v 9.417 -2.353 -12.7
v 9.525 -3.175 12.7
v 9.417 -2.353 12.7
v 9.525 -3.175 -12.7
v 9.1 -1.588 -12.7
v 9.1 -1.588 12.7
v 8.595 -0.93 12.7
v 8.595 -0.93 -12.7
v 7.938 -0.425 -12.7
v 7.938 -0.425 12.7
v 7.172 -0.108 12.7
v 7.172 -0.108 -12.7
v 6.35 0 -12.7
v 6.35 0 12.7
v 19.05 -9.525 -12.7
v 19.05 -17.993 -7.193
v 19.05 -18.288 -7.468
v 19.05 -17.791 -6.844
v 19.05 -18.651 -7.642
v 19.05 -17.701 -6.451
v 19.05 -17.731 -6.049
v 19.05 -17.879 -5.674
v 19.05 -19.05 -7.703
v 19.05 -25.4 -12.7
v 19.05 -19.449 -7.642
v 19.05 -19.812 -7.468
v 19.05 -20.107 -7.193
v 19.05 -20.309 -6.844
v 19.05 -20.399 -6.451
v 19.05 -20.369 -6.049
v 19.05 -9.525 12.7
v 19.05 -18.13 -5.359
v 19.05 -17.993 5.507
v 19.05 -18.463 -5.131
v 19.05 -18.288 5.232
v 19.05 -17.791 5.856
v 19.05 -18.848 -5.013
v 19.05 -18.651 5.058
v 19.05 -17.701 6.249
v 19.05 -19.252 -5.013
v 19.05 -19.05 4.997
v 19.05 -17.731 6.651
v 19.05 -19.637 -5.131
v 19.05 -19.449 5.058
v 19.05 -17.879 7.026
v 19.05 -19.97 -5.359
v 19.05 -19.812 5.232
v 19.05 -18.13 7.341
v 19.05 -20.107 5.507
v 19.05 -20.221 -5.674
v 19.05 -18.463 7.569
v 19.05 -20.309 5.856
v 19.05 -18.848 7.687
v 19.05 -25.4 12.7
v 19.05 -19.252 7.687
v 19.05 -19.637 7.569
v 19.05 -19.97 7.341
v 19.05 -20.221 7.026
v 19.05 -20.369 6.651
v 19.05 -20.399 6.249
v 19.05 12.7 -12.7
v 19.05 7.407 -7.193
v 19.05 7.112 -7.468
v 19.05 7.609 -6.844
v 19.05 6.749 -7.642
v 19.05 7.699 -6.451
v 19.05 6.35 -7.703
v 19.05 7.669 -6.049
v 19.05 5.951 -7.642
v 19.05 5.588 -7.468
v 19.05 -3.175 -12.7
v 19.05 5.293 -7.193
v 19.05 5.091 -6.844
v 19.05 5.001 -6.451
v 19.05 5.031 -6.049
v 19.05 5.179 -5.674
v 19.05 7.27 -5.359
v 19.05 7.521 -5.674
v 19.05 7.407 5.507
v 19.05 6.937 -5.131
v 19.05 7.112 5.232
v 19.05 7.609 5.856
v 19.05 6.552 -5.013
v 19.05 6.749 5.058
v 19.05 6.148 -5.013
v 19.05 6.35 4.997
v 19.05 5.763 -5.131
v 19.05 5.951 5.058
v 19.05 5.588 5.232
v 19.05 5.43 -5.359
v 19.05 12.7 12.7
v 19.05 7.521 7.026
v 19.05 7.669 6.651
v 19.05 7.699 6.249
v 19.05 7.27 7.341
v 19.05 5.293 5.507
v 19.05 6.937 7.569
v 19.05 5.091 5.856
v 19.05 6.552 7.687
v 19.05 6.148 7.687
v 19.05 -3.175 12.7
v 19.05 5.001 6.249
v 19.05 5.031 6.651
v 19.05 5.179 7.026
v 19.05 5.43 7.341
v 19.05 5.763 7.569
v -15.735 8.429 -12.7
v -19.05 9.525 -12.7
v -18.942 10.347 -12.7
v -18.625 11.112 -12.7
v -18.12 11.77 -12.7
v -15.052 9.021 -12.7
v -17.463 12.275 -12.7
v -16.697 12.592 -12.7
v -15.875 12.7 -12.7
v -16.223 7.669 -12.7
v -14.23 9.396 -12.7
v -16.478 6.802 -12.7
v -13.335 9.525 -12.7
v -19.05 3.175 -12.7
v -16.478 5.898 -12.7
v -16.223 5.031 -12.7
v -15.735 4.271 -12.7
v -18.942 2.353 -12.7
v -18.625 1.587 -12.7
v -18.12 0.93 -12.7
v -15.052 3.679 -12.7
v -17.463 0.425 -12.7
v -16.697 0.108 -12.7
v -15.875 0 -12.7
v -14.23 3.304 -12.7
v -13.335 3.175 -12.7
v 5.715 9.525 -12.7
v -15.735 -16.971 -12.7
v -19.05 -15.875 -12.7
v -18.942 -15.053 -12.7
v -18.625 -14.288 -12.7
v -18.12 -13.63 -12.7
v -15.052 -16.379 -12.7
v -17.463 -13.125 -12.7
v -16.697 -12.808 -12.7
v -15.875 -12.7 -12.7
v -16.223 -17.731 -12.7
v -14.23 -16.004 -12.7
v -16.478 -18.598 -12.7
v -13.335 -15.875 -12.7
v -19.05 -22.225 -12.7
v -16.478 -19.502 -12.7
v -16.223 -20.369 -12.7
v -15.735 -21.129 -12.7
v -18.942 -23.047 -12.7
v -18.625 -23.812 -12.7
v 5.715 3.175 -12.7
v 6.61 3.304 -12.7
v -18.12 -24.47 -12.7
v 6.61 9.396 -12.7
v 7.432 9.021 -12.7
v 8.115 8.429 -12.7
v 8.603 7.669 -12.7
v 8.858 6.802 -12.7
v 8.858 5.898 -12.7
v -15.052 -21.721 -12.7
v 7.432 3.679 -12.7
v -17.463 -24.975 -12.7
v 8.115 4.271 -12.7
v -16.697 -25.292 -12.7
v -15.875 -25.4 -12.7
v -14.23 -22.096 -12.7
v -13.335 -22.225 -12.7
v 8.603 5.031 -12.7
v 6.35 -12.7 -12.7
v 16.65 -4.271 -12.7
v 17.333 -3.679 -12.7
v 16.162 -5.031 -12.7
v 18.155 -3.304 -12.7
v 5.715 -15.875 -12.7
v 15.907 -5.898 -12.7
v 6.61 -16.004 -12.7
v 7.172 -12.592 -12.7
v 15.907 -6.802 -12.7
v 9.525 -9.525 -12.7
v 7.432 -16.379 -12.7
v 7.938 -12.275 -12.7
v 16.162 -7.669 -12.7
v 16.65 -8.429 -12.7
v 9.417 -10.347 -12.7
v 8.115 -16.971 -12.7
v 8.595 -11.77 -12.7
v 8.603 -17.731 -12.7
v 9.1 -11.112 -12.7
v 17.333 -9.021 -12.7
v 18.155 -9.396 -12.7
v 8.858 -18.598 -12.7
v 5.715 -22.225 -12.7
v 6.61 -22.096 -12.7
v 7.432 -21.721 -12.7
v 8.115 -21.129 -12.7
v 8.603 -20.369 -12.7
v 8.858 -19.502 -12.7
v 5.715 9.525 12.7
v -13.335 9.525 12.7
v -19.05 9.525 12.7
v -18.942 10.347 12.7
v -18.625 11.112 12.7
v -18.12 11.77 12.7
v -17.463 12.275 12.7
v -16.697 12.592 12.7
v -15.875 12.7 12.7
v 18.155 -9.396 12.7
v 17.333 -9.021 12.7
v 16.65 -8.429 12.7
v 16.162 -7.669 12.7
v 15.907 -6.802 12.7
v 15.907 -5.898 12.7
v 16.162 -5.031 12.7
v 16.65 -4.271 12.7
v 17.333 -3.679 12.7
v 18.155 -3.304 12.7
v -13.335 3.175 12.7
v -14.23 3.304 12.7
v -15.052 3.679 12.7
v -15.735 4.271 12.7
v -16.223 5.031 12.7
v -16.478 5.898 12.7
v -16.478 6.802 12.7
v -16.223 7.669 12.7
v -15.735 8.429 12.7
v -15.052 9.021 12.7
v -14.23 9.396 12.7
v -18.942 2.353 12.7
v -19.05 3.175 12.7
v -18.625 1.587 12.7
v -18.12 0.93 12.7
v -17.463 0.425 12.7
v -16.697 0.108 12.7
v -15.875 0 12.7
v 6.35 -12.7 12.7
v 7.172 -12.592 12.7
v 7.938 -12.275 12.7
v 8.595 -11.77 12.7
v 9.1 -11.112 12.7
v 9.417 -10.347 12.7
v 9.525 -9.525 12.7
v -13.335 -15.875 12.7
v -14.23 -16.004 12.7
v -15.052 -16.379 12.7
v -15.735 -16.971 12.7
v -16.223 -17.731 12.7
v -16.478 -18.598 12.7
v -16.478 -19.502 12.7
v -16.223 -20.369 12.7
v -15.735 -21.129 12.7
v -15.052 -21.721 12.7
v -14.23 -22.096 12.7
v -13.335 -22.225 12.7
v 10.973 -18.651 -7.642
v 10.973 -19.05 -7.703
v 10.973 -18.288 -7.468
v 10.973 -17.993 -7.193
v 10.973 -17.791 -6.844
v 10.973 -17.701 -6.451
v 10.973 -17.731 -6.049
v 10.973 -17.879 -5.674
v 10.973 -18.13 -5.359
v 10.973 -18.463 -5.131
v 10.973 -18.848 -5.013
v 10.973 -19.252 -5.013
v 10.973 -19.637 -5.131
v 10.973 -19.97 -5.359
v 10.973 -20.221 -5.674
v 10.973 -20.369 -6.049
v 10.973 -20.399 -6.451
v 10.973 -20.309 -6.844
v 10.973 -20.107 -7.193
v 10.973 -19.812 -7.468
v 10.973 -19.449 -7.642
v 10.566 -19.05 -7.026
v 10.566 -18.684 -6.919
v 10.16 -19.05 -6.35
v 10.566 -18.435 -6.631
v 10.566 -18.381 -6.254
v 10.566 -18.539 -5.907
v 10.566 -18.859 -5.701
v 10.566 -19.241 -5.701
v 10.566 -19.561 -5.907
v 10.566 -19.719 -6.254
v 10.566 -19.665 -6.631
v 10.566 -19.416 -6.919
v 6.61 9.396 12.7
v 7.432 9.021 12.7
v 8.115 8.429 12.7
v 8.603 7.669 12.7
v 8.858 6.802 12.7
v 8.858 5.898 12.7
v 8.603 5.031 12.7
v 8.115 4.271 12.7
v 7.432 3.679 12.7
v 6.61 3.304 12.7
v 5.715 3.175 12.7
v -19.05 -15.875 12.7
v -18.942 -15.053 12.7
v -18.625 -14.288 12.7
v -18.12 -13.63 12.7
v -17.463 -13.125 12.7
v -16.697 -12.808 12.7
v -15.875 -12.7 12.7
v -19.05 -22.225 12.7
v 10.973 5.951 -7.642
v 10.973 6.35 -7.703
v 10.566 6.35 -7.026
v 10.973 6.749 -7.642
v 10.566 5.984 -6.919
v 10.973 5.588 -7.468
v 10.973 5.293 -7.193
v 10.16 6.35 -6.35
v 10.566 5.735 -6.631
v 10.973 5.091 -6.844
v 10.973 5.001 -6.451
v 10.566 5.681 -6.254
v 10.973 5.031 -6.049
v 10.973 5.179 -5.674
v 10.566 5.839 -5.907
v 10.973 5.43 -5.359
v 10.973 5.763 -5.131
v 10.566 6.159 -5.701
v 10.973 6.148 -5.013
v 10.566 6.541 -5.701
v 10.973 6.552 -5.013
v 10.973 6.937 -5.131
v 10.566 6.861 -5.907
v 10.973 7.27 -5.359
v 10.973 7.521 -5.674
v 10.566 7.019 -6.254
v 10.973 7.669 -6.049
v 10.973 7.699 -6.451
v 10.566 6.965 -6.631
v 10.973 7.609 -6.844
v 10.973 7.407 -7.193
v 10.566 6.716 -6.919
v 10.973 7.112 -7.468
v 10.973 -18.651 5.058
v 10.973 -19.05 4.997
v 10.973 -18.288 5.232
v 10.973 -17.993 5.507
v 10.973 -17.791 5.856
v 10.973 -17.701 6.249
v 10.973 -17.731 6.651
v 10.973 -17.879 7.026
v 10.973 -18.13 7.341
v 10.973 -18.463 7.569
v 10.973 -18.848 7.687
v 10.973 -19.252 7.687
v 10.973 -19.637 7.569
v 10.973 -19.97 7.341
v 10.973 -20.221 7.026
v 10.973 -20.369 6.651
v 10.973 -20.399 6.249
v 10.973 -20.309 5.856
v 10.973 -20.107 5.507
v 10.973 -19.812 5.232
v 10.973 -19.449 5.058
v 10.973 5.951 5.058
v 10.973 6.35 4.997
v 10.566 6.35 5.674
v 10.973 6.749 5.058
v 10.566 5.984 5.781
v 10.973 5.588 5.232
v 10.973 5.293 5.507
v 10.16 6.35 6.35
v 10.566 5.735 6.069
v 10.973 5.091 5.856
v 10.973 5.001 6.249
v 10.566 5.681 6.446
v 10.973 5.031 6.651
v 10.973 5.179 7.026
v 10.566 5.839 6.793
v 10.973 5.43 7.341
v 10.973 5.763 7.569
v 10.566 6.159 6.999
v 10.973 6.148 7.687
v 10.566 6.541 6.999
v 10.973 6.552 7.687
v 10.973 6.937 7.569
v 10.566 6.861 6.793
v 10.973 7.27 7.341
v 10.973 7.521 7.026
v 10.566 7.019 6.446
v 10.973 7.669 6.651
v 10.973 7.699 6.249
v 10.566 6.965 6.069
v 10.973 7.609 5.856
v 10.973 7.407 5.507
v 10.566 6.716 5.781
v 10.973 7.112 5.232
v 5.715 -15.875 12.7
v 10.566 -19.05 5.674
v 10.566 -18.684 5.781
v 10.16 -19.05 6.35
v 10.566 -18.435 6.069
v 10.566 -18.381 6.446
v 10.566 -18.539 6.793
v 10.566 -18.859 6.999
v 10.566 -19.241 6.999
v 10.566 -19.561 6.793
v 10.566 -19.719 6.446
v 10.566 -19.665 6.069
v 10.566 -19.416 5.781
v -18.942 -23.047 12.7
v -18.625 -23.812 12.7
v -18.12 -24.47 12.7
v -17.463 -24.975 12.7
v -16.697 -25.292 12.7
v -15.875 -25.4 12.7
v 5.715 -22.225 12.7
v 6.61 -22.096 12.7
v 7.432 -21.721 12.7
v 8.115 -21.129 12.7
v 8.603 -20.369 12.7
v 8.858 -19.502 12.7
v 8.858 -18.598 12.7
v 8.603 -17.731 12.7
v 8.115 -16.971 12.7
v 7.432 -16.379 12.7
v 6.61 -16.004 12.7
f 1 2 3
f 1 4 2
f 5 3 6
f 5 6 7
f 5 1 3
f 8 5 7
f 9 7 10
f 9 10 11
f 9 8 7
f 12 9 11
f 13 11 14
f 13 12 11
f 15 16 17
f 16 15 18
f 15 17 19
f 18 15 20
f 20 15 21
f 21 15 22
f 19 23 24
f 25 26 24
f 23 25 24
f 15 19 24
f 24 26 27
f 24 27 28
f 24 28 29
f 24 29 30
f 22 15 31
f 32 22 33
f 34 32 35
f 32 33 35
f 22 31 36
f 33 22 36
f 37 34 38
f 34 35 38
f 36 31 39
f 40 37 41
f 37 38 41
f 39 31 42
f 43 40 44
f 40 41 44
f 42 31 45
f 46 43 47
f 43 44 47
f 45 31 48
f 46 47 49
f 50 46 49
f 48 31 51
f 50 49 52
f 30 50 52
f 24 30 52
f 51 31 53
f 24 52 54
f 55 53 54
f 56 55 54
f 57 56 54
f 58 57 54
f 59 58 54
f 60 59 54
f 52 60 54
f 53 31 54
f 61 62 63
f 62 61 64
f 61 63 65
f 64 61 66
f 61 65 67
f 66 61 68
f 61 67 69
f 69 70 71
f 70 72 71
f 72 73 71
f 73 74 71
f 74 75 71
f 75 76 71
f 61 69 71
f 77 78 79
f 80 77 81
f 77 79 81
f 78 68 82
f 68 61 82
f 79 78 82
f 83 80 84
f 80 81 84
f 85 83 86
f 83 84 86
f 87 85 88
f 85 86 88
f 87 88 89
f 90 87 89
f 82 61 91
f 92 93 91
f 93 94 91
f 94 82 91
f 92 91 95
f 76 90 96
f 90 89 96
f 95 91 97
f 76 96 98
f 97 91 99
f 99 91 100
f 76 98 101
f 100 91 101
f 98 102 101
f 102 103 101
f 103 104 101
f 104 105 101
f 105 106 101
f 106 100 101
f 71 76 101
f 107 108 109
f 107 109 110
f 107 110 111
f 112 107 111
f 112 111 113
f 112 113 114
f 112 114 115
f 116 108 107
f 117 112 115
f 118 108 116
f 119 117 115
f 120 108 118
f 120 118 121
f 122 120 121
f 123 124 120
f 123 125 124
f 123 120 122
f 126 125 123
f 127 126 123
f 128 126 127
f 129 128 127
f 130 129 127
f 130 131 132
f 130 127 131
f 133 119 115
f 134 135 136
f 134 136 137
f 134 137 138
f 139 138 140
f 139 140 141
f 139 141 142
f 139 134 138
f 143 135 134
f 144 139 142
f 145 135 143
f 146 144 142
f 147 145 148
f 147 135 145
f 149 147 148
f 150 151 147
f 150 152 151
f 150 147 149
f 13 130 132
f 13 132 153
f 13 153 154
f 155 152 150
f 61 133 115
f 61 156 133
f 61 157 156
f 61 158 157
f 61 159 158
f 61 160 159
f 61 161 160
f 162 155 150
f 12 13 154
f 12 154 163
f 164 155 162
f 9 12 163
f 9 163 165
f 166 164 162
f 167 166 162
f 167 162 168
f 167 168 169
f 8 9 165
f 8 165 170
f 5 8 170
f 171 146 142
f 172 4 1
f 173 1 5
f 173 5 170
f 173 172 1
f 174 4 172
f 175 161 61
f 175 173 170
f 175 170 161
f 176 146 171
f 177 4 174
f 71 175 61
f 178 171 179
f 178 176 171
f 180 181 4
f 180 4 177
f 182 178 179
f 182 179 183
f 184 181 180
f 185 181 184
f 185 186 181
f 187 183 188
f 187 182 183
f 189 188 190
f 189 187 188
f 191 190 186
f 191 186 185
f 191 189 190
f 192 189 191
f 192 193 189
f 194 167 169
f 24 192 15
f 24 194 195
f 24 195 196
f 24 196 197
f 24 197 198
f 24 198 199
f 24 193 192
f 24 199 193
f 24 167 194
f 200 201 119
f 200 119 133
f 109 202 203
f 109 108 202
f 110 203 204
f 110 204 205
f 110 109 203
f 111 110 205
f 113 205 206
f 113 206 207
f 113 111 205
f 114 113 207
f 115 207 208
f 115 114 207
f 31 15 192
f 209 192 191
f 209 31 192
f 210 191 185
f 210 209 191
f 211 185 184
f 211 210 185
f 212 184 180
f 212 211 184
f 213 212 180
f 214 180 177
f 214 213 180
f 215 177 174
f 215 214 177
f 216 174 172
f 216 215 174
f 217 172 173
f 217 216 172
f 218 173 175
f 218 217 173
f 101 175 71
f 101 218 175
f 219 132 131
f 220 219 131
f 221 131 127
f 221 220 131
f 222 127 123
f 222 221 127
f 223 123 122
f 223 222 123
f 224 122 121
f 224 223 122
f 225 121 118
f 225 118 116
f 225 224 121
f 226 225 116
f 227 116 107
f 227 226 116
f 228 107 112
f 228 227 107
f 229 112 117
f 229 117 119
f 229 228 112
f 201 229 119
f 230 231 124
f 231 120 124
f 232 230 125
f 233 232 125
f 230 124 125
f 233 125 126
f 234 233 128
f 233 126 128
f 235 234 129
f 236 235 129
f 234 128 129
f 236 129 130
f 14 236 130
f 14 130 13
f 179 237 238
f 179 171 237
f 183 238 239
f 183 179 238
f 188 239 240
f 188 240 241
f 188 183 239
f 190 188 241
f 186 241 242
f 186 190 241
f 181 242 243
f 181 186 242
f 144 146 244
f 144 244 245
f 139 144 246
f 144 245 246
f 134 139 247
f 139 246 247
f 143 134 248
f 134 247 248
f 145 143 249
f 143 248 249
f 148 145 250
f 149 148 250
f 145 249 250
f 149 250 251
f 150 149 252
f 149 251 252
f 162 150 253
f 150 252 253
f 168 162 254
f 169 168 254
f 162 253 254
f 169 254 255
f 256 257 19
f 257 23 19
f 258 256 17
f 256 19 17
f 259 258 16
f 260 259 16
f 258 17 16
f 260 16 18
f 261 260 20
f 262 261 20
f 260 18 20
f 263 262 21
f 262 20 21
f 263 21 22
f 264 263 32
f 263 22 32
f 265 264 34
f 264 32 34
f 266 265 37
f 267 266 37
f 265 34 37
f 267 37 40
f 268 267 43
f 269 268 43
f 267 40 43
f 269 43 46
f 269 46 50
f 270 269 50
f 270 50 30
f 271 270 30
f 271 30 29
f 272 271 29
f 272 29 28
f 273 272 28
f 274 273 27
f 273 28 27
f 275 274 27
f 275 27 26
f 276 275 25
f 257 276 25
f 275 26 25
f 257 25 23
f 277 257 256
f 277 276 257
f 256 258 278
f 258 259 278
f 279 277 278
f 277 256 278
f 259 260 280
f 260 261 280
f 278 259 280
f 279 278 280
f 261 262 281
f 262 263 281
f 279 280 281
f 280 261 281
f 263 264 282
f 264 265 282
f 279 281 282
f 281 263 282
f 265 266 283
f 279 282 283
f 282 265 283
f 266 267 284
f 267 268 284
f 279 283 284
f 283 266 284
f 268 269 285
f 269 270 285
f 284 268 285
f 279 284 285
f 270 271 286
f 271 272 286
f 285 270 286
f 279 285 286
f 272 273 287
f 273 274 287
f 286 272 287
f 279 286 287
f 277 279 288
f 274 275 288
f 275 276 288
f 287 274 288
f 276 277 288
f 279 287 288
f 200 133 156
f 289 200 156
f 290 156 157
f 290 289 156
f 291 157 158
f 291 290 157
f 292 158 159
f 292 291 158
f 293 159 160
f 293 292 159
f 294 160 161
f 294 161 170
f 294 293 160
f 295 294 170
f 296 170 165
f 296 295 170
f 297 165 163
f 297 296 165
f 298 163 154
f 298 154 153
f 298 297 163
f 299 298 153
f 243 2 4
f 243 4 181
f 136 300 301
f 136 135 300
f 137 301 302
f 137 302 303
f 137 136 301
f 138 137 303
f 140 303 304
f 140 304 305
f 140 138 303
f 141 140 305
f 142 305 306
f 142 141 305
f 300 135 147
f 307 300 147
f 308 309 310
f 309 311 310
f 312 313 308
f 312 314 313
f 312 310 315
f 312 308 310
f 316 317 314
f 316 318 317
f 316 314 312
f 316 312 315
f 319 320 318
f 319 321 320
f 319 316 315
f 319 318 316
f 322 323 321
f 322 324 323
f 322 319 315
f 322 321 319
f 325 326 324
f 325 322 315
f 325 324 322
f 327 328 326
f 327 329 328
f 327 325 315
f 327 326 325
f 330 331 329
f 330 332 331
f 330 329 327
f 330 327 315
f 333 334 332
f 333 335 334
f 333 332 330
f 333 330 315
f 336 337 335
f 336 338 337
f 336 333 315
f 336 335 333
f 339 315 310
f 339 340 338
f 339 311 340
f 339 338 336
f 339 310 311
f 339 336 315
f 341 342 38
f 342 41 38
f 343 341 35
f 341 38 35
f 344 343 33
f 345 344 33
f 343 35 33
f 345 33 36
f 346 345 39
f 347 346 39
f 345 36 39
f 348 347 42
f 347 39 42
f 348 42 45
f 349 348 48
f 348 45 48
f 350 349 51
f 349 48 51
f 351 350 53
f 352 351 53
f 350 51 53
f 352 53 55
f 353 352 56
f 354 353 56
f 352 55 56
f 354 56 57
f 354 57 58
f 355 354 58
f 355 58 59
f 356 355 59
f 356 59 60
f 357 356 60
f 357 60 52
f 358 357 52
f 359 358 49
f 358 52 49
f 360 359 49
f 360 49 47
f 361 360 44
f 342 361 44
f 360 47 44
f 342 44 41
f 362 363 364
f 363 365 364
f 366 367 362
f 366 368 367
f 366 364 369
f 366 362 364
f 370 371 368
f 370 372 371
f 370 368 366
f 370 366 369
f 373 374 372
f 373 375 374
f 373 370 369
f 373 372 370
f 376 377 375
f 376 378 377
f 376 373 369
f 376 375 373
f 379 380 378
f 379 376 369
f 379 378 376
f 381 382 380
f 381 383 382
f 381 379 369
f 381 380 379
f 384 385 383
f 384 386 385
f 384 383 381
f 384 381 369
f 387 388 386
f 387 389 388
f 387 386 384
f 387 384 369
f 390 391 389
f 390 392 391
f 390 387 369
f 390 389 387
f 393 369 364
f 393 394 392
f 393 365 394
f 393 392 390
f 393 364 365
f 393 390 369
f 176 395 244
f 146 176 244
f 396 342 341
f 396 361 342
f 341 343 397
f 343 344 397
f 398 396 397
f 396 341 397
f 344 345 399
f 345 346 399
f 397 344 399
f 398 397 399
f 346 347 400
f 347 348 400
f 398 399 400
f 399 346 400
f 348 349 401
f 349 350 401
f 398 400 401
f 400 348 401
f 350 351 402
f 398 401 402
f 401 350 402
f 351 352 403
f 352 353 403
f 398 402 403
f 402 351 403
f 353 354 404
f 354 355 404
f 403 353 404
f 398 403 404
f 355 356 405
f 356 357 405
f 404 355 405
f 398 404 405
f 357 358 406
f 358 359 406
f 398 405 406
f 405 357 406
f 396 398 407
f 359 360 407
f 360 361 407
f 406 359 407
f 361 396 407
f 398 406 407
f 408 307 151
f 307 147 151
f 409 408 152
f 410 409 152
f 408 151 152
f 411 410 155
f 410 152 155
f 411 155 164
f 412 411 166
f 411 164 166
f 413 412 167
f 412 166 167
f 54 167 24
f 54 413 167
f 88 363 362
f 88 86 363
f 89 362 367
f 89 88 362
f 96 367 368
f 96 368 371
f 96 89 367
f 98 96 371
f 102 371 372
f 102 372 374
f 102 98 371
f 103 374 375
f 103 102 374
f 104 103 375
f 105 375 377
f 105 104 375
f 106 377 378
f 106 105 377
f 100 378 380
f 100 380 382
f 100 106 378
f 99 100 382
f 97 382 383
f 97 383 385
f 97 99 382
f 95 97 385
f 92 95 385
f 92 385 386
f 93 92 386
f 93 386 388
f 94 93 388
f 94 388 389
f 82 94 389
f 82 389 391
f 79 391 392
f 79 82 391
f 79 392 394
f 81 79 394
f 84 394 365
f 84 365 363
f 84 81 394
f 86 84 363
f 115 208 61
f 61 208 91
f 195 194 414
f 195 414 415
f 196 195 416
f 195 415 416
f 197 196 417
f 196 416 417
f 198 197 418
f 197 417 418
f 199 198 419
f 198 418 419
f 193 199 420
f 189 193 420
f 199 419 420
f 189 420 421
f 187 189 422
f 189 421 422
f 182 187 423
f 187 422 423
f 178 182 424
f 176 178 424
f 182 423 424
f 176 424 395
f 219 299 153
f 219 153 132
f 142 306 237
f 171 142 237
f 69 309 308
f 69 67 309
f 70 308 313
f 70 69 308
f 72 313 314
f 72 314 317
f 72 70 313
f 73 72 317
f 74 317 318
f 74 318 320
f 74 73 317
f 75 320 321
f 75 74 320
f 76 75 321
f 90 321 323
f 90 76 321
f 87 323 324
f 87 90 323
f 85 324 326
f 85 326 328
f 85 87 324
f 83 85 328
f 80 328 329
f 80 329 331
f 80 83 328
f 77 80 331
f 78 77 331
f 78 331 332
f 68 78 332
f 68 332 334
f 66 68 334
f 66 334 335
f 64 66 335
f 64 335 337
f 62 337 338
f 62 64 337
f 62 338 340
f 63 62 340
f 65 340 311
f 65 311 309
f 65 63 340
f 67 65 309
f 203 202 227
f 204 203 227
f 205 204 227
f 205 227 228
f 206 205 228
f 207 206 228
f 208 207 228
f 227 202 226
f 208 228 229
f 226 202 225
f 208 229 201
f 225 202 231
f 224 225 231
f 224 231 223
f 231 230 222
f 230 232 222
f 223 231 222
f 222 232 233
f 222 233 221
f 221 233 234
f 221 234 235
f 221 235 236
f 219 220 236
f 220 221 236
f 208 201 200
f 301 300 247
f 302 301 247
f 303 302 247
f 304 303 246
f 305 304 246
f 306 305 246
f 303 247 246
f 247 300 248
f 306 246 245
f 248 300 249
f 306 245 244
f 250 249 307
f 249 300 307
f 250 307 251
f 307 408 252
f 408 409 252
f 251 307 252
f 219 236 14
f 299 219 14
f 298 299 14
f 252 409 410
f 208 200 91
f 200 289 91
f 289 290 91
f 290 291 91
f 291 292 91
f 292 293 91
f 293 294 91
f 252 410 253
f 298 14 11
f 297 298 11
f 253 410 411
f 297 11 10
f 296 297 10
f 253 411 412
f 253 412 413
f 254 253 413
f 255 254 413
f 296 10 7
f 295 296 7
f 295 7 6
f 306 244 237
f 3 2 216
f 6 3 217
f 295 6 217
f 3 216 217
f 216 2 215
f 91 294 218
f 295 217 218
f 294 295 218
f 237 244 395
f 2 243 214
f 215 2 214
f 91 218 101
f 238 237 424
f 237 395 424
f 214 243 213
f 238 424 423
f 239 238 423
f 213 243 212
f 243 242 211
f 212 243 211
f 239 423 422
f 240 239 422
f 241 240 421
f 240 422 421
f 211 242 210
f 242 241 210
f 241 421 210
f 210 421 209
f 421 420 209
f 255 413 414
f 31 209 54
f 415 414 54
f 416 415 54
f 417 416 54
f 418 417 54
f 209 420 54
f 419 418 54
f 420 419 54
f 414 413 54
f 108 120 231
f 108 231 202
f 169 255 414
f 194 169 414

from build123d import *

# Parameters (mm, degrees)
SKETCH1_W                      = 38.1
SKETCH1_H                      = 25.4
BOSS_EXTRUDE1_DEPTH            = 12.7
CUT_EXTRUDE2_REACH             = 36.196
SKETCH7_R                      = 3.175
F_6_32_TAPPED_HOLE1_AT_2_COUNT = 2
F_6_32_TAPPED_HOLE1_AT_2_PITCH = 12.7
CUT_EXTRUDE3_DEPTH             = 25.4
SKETCH14_W                     = 28.575
SKETCH14_H                     = 12.7
CUT_EXTRUDE5_DEPTH             = 25.4
FILLET2_R                      = 3.175
FILLET2_OF_MIRROR1_R           = 3.175
FILLET3_R                      = 3.175


with BuildPart() as part:
    # Sketch1 → Boss-Extrude1 (new, symmetric)
    with BuildSketch(Plane.XY):
        Rectangle(SKETCH1_W, SKETCH1_H)
    boss_extrude1 = extrude(amount=BOSS_EXTRUDE1_DEPTH, both=True)

    # Sketch7 → Cut-Extrude2 (cut, up to next)
    with BuildSketch(Plane.XY.offset(12.7), mode=Mode.PRIVATE) as cut_extrude2_sk1:
        with Locations((19.05, -6.35)):
            Circle(SKETCH7_R)
    cut_extrude2_tool1 = extrude(cut_extrude2_sk1.sketch, amount=-CUT_EXTRUDE2_REACH, mode=Mode.PRIVATE) & part.part
    cut_extrude2 = cut_extrude2_tool1.solids().sort_by_distance((19.05, -6.35, 12.7))[0]
    add(cut_extrude2, mode=Mode.SUBTRACT)

    # Sketch11 → #6-32 Tapped Hole1 (revolve, cut)
    with BuildSketch(Plane(origin=(19.05, 6.35, 6.35), x_dir=(0, 0, -1), z_dir=(0, 1, 0))):
        Polygon((0, 0), (0, 8.89), (1.35255, 8.07730597), (1.35255, 0), align=None)
    f_6_32_tapped_hole1 = revolve(axis=Axis((25.4, 6.35, 6.35), (-1, 0, 0)), mode=Mode.SUBTRACT)

    # #6-32 Tapped Hole1 at 2: #6-32 Tapped Hole1 ×2
    with Locations(*[(0, 0, -i * F_6_32_TAPPED_HOLE1_AT_2_PITCH) for i in range(1, F_6_32_TAPPED_HOLE1_AT_2_COUNT)]):
        add(f_6_32_tapped_hole1, mode=Mode.SUBTRACT)

    # Sketch12 → Cut-Extrude3 (cut)
    with BuildSketch(Plane.XY.offset(12.7)):
        with BuildLine():
            Line((-13.335, 9.525), (5.715, 9.525))
            ThreePointArc((5.715, 9.525), (8.89, 6.35), (5.715, 3.175))
            Line((5.715, 3.175), (-13.335, 3.175))
            ThreePointArc((-13.335, 3.175), (-16.51, 6.35), (-13.335, 9.525))
        make_face()
    cut_extrude3 = extrude(amount=-CUT_EXTRUDE3_DEPTH, mode=Mode.SUBTRACT)

    # Sketch14 → Cut-Extrude5 (cut)
    with BuildSketch(Plane.XY.offset(12.7)):
        with Locations((-4.7625, -6.35)):
            Rectangle(SKETCH14_W, SKETCH14_H)
    cut_extrude5 = extrude(amount=-CUT_EXTRUDE5_DEPTH, mode=Mode.SUBTRACT)

    # Fillet2
    fillet2_edges = [part.edges().sort_by_distance(p)[0] for p in [
        (-19.05, 0, 0),
        (9.525, 0, 0),
        (-19.05, 12.7, 0),
    ]]
    fillet(fillet2_edges, radius=FILLET2_R)

    # Mirror1: Boss-Extrude1, Cut-Extrude2, #6-32 Tapped Hole1, Cut-Extrude3, Cut-Extrude5 across plane
    add(boss_extrude1.mirror(Plane.ZX.offset(-6.35)))
    add(cut_extrude2.mirror(Plane.ZX.offset(-6.35)), mode=Mode.SUBTRACT)
    add(f_6_32_tapped_hole1.mirror(Plane.ZX.offset(-6.35)), mode=Mode.SUBTRACT)
    add(cut_extrude3.mirror(Plane.ZX.offset(-6.35)), mode=Mode.SUBTRACT)
    add(cut_extrude5.mirror(Plane.ZX.offset(-6.35)), mode=Mode.SUBTRACT)

    # Mirror1 copy 1 sketch → Mirror1 copy 1 (revolve, cut)
    with BuildSketch(Plane(origin=(19.05, -19.05, -6.35), x_dir=(0, 0, -1), z_dir=(0, -1, 0))):
        Polygon((0, 0), (0, -8.89), (1.35255, -8.07730597), (1.35255, 0), align=None)
    revolve(axis=Axis((25.4, -19.05, -6.35), (1, 0, 0)), mode=Mode.SUBTRACT)

    # Fillet2 of Mirror1
    fillet2_of_mirror1_edges = [part.edges().sort_by_distance(p)[0] for p in [
        (-19.05, -12.7, 0),
        (9.525, -12.7, 0),
        (-19.05, -25.4, 0),
    ]]
    fillet(fillet2_of_mirror1_edges, radius=FILLET2_OF_MIRROR1_R)

    # Fillet3
    fillet3_edges = [part.edges().sort_by_distance(p)[0] for p in [
        (9.525, 0, 0),
    ]]
    fillet(fillet3_edges, radius=FILLET3_R)


solid = part.part
